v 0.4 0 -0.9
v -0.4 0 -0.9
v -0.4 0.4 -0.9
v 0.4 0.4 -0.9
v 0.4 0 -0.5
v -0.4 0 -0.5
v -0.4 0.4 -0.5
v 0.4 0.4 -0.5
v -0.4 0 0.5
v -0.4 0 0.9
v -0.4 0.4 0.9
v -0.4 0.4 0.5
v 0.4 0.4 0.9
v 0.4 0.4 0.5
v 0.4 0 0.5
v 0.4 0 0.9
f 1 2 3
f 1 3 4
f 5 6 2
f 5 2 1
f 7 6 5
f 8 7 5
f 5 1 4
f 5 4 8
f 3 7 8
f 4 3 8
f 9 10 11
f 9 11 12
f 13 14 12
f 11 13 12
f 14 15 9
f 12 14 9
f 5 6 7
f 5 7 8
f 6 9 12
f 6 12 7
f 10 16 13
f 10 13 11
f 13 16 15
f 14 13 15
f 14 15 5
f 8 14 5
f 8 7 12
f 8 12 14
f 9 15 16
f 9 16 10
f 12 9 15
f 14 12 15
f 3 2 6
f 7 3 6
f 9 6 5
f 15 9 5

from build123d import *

# Parameters (mm, degrees)
MAINBODYS_W         = 0.8
MAINBODYS_H         = 1
MAINBODY_DEPTH      = 0.4
LEFTBODYS_W         = 0.8
LEFTBODYS_H         = 0.4
BOSS_EXTRUDE1_DEPTH = 0.4
RIGHTBODYS_W        = 0.8
RIGHTBODYS_H        = 0.4
BOSS_EXTRUDE2_DEPTH = 0.4


with BuildPart() as part:
    # MainBodyS → MainBody (new body)
    with BuildSketch(Plane(origin=(0, 0, 0), x_dir=(1, 0, 0), z_dir=(0, 1, 0))):
        Rectangle(MAINBODYS_W, MAINBODYS_H)
    extrude(amount=MAINBODY_DEPTH)


with BuildPart() as body_2:
    # LeftBodyS → Boss-Extrude1 (new body)
    with BuildSketch(Plane(origin=(0, 0, 0), x_dir=(-1, 0, 0), z_dir=(0, -1, 0))):
        with Locations((0, -0.7)):
            Rectangle(LEFTBODYS_W, LEFTBODYS_H)
    extrude(amount=-BOSS_EXTRUDE1_DEPTH)


with BuildPart() as body_3:
    # RightBodyS → Boss-Extrude2 (new body)
    with BuildSketch(Plane.XZ):
        with Locations((0, -0.7)):
            Rectangle(RIGHTBODYS_W, RIGHTBODYS_H)
    extrude(amount=-BOSS_EXTRUDE2_DEPTH)


solid = Compound([part.part, body_2.part, body_3.part])
